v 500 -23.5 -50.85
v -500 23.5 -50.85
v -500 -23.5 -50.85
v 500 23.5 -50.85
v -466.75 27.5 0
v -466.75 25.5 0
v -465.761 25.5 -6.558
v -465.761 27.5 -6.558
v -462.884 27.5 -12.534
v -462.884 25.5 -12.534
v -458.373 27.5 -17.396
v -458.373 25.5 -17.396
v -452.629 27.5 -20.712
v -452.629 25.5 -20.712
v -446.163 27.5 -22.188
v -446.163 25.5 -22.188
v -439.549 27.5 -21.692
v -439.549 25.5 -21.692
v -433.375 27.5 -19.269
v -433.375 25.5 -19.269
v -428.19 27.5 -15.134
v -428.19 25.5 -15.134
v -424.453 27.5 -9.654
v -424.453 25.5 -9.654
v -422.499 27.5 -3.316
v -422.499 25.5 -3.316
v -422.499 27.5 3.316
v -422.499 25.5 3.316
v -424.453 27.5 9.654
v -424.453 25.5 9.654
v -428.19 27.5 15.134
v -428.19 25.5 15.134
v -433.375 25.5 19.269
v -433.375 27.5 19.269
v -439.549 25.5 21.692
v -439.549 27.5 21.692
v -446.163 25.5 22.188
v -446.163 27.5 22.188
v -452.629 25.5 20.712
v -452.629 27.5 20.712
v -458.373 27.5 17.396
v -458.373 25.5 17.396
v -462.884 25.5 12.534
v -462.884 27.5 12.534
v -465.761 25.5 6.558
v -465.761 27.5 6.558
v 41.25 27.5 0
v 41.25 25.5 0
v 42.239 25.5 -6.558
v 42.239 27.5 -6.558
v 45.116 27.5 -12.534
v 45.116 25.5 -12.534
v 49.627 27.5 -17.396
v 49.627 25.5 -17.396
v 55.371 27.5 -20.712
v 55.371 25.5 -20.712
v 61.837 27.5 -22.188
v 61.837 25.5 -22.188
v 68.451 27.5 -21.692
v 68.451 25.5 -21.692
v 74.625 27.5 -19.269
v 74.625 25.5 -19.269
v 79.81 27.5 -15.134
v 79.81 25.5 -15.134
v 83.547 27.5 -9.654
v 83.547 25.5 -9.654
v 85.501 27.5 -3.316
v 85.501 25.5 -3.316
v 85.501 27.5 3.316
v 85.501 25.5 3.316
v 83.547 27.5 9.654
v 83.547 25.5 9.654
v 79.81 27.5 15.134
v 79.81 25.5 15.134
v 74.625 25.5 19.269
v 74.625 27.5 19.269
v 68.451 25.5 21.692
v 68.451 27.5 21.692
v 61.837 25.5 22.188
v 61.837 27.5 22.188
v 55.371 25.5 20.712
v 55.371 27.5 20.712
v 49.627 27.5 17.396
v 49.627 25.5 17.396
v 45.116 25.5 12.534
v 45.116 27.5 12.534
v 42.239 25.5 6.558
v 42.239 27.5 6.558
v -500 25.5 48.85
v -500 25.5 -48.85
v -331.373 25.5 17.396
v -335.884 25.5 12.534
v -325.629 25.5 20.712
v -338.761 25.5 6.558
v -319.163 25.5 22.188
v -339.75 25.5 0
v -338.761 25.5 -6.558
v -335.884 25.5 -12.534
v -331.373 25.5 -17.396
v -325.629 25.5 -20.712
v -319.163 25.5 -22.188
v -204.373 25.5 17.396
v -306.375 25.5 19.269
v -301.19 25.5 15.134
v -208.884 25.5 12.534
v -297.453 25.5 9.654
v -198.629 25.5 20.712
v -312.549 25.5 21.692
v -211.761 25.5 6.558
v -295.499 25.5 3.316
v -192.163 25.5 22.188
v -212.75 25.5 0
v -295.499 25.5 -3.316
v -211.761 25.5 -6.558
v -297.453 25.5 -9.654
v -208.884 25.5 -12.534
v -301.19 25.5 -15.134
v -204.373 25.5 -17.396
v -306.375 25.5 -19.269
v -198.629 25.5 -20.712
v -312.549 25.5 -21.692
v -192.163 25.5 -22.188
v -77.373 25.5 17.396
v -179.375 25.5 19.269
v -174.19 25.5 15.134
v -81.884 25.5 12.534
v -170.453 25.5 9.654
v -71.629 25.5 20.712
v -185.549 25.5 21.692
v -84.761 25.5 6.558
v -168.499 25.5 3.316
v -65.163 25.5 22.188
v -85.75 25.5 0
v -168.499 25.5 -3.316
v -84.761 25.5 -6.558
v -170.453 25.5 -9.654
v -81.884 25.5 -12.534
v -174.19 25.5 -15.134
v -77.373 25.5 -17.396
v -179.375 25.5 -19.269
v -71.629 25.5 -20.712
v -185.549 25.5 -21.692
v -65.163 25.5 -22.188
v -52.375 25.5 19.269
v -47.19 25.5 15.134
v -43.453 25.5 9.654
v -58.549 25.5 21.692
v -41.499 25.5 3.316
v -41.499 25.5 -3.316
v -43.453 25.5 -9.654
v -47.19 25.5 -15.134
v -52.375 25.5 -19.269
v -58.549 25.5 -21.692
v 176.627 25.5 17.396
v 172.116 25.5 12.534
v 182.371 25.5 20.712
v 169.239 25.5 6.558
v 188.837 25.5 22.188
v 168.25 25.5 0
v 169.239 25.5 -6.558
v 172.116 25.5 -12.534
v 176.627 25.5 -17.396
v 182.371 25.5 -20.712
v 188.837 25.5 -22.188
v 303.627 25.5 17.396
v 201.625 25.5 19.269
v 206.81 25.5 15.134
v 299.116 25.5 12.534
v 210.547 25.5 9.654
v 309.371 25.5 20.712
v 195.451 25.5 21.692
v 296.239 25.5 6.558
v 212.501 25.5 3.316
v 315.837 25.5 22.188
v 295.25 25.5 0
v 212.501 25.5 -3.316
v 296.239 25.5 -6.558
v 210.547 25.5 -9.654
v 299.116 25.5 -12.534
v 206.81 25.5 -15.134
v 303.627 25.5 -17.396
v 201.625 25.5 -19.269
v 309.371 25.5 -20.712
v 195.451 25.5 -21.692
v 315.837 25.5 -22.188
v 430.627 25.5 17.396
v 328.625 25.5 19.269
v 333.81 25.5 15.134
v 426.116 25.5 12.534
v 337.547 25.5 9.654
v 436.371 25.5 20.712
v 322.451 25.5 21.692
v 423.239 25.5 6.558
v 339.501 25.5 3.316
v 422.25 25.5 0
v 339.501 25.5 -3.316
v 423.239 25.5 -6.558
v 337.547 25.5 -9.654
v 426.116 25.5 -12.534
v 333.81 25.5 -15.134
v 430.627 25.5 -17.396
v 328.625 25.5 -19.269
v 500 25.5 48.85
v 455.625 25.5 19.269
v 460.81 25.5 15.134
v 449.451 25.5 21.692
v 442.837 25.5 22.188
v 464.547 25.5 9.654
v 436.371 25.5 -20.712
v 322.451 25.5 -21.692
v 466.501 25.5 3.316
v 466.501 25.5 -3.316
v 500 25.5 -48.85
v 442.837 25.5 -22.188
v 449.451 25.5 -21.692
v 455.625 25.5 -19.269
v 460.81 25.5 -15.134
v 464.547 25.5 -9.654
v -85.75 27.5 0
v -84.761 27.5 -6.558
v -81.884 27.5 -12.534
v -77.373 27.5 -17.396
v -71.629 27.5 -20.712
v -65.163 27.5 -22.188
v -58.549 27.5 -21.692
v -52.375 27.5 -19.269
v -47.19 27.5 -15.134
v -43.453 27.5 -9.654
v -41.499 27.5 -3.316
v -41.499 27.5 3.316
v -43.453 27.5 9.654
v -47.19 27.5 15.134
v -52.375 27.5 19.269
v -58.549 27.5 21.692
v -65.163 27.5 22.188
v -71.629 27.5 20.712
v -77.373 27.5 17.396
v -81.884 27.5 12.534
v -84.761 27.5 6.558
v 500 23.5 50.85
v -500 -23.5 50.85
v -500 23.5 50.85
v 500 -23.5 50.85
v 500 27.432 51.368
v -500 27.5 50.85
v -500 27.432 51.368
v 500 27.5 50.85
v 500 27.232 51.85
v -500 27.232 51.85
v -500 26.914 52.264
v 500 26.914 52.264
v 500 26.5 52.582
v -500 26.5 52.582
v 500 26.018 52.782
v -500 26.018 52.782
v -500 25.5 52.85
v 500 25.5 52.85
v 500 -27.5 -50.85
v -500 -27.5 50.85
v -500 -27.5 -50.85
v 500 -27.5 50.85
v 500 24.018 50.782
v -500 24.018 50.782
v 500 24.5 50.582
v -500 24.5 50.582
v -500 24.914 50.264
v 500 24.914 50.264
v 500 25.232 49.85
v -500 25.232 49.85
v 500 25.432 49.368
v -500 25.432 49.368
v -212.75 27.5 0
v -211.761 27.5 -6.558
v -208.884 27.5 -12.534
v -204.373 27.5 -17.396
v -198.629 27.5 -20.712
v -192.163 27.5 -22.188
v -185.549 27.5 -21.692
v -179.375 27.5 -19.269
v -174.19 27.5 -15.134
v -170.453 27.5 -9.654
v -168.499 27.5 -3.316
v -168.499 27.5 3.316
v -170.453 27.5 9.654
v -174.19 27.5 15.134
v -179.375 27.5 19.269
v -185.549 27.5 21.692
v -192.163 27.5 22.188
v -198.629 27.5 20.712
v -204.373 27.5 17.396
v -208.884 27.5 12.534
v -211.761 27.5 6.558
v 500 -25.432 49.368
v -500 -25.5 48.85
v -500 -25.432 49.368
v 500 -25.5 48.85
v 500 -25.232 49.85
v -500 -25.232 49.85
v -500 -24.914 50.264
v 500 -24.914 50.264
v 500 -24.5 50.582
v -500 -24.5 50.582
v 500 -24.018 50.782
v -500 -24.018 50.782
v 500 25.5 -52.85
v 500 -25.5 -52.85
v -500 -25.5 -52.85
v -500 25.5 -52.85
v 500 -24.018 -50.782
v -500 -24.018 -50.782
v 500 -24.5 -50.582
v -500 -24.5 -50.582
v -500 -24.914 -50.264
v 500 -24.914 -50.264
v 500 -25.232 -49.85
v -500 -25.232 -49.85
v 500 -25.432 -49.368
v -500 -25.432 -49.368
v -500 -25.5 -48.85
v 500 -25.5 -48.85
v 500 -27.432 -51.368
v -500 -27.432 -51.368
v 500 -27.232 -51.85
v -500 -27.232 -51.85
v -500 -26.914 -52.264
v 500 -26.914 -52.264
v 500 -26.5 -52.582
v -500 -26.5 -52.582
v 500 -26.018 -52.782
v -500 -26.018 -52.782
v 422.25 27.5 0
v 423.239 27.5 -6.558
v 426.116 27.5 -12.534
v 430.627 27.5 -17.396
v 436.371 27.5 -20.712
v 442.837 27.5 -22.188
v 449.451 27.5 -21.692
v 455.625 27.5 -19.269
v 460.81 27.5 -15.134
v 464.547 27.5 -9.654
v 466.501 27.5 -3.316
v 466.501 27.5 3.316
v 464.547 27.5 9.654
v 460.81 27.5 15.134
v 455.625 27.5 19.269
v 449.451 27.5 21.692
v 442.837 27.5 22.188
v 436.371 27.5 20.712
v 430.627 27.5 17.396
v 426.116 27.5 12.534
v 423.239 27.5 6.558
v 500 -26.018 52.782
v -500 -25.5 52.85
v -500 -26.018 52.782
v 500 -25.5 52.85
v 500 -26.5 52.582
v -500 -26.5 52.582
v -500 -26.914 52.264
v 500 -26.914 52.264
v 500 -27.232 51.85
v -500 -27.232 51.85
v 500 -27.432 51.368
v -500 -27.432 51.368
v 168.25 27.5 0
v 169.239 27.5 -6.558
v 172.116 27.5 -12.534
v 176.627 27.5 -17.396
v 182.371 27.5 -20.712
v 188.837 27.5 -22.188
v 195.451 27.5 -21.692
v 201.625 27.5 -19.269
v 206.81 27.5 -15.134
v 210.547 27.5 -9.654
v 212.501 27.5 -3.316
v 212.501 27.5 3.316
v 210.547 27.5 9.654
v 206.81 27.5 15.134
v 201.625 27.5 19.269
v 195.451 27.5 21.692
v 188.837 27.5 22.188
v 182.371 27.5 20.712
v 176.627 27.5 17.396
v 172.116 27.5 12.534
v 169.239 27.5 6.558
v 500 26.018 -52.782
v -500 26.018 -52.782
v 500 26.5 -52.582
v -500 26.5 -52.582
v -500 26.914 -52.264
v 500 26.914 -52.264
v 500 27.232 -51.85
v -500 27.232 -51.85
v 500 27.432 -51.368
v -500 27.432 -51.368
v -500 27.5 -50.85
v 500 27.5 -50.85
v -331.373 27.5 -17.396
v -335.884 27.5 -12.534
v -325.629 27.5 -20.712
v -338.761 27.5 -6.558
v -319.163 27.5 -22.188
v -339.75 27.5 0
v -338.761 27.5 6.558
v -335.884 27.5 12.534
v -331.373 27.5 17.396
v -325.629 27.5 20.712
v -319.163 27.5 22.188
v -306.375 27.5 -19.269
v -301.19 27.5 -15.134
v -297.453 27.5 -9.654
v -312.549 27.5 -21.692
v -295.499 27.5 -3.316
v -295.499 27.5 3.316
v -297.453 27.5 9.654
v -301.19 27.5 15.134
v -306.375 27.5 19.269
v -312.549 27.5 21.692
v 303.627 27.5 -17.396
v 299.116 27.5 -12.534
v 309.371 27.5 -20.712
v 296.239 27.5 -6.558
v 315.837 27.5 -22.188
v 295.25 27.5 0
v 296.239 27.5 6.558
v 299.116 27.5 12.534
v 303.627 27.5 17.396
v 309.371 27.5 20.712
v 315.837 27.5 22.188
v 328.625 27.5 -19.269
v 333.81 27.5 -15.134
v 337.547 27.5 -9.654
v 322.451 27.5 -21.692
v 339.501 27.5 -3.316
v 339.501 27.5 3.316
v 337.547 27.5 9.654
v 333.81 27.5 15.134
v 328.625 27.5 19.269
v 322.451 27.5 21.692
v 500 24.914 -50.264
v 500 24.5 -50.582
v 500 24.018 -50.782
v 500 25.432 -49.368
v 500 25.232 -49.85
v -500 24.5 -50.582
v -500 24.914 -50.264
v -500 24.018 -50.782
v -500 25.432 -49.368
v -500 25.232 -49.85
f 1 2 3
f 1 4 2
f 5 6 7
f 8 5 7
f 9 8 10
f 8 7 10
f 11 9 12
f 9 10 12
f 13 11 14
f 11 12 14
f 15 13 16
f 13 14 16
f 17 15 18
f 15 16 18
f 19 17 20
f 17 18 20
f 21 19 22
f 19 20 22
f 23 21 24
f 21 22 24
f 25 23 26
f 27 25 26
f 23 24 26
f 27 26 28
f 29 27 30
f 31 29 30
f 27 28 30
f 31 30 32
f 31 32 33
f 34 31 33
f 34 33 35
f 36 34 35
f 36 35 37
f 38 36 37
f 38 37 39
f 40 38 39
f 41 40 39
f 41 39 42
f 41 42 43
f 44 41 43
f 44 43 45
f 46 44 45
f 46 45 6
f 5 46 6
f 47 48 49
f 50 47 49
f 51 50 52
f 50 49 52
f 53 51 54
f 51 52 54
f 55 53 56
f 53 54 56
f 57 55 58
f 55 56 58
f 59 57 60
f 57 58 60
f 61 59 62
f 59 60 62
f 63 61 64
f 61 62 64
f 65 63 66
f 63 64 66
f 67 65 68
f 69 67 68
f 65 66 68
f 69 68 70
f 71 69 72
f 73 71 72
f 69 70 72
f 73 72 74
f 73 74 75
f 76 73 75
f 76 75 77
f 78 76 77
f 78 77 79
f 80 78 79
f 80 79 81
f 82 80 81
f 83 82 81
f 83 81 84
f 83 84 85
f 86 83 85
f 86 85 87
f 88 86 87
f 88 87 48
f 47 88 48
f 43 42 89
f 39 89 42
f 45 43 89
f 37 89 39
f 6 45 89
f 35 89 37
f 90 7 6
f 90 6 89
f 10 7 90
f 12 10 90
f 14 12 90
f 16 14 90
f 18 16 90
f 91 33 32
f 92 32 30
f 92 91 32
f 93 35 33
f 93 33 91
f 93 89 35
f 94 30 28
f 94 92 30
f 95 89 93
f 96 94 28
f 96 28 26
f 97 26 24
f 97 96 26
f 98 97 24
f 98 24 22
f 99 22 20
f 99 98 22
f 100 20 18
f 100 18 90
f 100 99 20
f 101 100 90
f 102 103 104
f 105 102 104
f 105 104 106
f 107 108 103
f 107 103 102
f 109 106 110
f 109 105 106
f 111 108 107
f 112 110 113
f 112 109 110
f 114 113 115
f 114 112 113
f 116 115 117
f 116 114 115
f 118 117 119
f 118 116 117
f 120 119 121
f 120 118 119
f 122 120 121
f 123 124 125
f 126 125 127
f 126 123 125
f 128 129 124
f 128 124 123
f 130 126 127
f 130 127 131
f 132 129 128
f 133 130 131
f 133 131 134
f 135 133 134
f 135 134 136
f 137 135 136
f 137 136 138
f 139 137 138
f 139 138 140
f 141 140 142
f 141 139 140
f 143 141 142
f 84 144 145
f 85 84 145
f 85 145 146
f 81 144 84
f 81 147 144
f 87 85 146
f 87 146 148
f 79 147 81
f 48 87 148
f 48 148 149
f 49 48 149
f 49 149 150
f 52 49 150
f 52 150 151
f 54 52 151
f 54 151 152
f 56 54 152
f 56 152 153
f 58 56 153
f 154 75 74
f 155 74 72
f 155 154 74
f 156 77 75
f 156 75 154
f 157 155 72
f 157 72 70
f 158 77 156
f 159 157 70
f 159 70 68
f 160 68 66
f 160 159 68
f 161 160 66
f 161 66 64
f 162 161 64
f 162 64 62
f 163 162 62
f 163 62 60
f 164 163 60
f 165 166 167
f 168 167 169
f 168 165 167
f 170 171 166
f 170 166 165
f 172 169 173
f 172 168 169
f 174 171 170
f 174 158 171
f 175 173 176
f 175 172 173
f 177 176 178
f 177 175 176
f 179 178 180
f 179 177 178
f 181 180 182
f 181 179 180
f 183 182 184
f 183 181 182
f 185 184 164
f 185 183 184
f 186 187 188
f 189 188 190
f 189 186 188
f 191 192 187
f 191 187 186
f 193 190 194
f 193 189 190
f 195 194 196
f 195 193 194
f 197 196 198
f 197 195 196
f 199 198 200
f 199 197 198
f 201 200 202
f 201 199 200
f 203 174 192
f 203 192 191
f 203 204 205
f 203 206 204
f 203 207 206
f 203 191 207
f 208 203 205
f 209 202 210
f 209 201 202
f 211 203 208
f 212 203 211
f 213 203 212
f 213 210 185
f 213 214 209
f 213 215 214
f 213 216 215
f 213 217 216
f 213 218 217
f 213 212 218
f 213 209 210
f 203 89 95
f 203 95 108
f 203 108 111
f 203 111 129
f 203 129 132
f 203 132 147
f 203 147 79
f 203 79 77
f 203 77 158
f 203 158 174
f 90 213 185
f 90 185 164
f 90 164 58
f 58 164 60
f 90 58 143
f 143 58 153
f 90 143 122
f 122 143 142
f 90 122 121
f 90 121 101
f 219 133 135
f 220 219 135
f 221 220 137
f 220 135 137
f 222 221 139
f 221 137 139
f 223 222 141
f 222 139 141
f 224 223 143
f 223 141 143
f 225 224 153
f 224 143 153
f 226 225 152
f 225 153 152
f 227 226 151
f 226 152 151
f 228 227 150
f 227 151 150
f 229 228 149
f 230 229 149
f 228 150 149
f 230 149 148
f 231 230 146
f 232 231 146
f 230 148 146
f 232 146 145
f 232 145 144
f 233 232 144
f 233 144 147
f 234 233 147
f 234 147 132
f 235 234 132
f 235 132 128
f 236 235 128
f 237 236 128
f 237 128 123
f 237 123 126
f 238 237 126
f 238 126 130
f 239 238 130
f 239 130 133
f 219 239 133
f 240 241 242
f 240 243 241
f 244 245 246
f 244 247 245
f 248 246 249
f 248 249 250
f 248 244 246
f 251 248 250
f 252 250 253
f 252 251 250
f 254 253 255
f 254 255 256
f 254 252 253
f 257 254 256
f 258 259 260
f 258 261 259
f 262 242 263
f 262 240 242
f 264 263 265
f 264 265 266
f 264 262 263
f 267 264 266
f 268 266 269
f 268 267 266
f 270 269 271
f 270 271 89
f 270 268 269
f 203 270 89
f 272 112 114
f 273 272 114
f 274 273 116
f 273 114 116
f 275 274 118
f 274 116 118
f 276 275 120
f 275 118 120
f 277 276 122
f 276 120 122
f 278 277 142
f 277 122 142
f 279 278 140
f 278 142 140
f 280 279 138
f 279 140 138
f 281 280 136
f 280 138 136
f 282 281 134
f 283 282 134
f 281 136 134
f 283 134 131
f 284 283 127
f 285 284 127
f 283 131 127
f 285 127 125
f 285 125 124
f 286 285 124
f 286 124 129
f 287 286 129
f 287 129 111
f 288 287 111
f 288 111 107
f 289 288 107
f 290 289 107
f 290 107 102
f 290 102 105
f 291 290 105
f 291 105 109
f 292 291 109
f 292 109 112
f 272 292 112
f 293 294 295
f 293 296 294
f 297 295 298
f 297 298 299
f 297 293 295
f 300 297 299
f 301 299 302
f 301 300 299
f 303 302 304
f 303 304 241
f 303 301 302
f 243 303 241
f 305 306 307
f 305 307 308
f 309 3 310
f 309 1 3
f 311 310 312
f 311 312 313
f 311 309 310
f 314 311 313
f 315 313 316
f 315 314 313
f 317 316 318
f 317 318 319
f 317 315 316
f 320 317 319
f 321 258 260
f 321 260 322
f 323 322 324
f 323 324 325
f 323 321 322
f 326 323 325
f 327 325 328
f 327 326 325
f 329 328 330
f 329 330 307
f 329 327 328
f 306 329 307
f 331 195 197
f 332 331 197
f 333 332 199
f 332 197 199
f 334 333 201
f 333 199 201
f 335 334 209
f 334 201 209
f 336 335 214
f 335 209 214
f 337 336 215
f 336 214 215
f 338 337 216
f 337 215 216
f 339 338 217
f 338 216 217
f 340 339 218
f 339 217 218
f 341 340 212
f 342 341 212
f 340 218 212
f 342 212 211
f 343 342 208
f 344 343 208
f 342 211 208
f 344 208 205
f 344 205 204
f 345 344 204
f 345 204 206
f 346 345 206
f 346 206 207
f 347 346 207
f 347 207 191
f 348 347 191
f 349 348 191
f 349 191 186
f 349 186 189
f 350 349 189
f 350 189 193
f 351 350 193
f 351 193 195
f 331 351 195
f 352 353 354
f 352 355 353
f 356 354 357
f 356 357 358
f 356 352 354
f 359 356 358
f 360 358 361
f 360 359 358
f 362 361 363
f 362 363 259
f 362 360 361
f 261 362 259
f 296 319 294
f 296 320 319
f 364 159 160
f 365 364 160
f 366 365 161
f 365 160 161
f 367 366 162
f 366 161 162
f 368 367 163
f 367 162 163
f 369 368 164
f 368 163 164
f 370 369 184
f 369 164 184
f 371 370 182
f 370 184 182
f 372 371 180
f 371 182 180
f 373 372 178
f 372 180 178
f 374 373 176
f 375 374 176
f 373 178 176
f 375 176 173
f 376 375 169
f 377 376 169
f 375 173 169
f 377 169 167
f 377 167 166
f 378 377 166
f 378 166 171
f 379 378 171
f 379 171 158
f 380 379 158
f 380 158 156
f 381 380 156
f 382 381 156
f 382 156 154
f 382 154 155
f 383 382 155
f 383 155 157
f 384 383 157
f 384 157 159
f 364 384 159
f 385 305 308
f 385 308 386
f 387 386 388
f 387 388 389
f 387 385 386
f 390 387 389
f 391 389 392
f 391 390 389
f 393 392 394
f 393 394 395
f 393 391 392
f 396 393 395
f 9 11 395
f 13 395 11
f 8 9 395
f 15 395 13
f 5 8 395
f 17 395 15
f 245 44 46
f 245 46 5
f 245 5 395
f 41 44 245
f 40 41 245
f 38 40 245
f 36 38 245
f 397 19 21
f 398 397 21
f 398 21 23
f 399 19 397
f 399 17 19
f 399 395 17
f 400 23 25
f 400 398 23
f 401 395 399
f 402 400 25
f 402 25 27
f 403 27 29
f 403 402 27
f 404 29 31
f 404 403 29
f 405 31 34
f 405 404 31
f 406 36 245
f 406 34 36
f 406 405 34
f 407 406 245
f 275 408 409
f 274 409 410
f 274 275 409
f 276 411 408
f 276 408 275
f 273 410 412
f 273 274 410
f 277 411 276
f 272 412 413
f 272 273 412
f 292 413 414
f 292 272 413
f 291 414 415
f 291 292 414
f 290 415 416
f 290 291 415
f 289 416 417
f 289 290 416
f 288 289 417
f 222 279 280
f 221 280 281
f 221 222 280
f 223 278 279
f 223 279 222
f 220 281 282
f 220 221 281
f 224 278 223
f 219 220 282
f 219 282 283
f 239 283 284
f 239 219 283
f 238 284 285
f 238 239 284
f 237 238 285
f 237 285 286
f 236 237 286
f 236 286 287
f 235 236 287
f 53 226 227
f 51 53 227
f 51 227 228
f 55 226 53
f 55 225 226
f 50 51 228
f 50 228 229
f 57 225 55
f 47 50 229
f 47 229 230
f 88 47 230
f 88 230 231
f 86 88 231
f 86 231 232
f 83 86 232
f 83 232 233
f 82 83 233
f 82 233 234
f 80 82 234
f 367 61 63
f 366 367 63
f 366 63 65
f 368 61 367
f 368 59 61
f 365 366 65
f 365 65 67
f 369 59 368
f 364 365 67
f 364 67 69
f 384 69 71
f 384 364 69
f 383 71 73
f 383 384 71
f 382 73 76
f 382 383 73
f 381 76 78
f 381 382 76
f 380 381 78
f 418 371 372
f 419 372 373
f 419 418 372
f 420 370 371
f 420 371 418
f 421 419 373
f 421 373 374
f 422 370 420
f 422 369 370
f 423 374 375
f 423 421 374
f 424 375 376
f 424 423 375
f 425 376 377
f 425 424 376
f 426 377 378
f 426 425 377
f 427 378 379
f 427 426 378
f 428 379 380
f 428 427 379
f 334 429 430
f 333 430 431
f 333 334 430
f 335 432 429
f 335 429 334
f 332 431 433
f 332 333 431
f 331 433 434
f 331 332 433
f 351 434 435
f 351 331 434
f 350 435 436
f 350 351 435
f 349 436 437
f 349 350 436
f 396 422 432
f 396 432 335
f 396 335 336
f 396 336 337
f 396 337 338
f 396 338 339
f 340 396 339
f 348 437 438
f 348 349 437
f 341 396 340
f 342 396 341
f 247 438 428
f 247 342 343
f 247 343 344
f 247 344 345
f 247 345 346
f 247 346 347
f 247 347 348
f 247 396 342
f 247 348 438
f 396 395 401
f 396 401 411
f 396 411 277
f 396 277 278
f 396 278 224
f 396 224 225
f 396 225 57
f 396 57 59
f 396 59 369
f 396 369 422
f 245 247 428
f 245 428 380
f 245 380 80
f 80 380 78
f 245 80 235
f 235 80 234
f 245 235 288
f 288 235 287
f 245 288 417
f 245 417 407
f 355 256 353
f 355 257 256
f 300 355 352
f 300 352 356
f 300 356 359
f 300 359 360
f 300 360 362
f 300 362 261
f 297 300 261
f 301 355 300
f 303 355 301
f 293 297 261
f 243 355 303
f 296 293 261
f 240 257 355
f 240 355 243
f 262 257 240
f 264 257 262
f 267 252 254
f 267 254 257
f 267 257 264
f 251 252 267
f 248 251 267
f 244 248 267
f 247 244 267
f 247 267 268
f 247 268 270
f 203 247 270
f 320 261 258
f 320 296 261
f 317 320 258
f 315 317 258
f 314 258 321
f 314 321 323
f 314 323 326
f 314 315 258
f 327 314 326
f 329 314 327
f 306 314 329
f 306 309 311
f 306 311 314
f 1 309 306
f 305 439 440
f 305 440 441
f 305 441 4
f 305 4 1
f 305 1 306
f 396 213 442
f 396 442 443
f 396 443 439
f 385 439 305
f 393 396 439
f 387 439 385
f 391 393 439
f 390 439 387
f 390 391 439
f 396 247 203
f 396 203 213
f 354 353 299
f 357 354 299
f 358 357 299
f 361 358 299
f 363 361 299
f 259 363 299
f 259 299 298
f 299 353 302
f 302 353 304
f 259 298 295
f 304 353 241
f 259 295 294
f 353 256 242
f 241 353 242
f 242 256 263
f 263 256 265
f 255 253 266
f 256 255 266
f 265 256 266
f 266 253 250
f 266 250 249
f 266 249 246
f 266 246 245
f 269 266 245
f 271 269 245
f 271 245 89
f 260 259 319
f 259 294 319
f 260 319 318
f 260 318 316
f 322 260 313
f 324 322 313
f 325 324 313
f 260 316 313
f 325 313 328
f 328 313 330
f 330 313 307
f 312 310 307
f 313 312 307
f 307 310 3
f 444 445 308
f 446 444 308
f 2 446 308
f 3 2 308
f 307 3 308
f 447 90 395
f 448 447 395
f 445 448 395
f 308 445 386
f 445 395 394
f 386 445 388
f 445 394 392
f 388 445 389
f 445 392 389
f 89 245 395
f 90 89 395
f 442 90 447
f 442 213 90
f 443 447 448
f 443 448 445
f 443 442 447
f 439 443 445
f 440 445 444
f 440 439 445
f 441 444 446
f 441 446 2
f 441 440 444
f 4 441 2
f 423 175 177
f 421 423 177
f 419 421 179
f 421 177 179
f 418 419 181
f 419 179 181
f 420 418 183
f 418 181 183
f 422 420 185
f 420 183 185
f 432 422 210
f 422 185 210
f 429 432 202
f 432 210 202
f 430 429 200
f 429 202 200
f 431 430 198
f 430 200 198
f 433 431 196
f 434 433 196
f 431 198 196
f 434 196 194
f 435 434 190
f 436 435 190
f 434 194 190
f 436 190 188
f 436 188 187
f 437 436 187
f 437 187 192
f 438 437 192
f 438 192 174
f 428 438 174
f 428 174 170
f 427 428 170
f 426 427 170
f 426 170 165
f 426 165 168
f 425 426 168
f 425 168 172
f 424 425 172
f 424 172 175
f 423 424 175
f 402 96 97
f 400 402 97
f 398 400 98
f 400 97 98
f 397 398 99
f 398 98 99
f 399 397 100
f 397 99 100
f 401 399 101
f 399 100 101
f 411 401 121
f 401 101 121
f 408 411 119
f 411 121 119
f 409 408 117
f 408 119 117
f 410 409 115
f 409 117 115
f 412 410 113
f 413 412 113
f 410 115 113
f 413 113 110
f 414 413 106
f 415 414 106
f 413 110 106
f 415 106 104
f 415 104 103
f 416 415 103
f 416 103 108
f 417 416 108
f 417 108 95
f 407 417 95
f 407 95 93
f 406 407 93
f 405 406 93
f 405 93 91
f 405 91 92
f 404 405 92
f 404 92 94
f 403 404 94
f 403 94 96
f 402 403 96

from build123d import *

# Parameters (mm, degrees)
BOSS_EXTRUDE1_DEPTH              = 500
F_0_15_44_5_DIAMETER_HOLE1_D     = 44.5
F_0_15_44_5_DIAMETER_HOLE1_DEPTH = 2


with BuildPart() as part:
    # Sketch1 → Boss-Extrude1 (new, symmetric)
    with BuildSketch(Plane(origin=(0, 0, 0), x_dir=(0, 0, -1), z_dir=(1, 0, 0))):
        with BuildLine():
            Line((-50.85, -27.5), (50.85, -27.5))
            ThreePointArc((50.85, -27.5), (52.264213562, -26.914213562), (52.85, -25.5))
            Line((52.85, -25.5), (52.85, 25.5))
            ThreePointArc((52.85, 25.5), (52.264213562, 26.914213562), (50.85, 27.5))
            Line((50.85, 27.5), (-50.85, 27.5))
            ThreePointArc((-50.85, 27.5), (-52.264213562, 26.914213562), (-52.85, 25.5))
            Line((-52.85, 25.5), (-52.85, -25.5))
            ThreePointArc((-52.85, -25.5), (-52.264213562, -26.914213562), (-50.85, -27.5))
        make_face()
        with BuildLine():
            Line((-48.85, 25.5), (48.85, 25.5))
            ThreePointArc((48.85, 25.5), (50.264213562, 24.914213562), (50.85, 23.5))
            Line((50.85, 23.5), (50.85, -23.5))
            ThreePointArc((50.85, -23.5), (50.264213562, -24.914213562), (48.85, -25.5))
            Line((48.85, -25.5), (-48.85, -25.5))
            ThreePointArc((-48.85, -25.5), (-50.264213562, -24.914213562), (-50.85, -23.5))
            Line((-50.85, -23.5), (-50.85, 23.5))
            ThreePointArc((-50.85, 23.5), (-50.264213562, 24.914213562), (-48.85, 25.5))
        make_face(mode=Mode.SUBTRACT)
    extrude(amount=BOSS_EXTRUDE1_DEPTH, both=True)

    # Ø0.15 (44.5) Diameter Hole1
    with Locations(Plane(origin=(0, 27.5, 0), x_dir=(1, 0, 0), z_dir=(0, 1, 0))):
        with Locations((-444.5, 0), (-317.5, 0), (-190.5, 0), (-63.5, 0), (63.5, 0), (190.5, 0), (317.5, 0), (444.5, 0)):
            Hole(F_0_15_44_5_DIAMETER_HOLE1_D / 2, depth=F_0_15_44_5_DIAMETER_HOLE1_DEPTH)


solid = part.part
